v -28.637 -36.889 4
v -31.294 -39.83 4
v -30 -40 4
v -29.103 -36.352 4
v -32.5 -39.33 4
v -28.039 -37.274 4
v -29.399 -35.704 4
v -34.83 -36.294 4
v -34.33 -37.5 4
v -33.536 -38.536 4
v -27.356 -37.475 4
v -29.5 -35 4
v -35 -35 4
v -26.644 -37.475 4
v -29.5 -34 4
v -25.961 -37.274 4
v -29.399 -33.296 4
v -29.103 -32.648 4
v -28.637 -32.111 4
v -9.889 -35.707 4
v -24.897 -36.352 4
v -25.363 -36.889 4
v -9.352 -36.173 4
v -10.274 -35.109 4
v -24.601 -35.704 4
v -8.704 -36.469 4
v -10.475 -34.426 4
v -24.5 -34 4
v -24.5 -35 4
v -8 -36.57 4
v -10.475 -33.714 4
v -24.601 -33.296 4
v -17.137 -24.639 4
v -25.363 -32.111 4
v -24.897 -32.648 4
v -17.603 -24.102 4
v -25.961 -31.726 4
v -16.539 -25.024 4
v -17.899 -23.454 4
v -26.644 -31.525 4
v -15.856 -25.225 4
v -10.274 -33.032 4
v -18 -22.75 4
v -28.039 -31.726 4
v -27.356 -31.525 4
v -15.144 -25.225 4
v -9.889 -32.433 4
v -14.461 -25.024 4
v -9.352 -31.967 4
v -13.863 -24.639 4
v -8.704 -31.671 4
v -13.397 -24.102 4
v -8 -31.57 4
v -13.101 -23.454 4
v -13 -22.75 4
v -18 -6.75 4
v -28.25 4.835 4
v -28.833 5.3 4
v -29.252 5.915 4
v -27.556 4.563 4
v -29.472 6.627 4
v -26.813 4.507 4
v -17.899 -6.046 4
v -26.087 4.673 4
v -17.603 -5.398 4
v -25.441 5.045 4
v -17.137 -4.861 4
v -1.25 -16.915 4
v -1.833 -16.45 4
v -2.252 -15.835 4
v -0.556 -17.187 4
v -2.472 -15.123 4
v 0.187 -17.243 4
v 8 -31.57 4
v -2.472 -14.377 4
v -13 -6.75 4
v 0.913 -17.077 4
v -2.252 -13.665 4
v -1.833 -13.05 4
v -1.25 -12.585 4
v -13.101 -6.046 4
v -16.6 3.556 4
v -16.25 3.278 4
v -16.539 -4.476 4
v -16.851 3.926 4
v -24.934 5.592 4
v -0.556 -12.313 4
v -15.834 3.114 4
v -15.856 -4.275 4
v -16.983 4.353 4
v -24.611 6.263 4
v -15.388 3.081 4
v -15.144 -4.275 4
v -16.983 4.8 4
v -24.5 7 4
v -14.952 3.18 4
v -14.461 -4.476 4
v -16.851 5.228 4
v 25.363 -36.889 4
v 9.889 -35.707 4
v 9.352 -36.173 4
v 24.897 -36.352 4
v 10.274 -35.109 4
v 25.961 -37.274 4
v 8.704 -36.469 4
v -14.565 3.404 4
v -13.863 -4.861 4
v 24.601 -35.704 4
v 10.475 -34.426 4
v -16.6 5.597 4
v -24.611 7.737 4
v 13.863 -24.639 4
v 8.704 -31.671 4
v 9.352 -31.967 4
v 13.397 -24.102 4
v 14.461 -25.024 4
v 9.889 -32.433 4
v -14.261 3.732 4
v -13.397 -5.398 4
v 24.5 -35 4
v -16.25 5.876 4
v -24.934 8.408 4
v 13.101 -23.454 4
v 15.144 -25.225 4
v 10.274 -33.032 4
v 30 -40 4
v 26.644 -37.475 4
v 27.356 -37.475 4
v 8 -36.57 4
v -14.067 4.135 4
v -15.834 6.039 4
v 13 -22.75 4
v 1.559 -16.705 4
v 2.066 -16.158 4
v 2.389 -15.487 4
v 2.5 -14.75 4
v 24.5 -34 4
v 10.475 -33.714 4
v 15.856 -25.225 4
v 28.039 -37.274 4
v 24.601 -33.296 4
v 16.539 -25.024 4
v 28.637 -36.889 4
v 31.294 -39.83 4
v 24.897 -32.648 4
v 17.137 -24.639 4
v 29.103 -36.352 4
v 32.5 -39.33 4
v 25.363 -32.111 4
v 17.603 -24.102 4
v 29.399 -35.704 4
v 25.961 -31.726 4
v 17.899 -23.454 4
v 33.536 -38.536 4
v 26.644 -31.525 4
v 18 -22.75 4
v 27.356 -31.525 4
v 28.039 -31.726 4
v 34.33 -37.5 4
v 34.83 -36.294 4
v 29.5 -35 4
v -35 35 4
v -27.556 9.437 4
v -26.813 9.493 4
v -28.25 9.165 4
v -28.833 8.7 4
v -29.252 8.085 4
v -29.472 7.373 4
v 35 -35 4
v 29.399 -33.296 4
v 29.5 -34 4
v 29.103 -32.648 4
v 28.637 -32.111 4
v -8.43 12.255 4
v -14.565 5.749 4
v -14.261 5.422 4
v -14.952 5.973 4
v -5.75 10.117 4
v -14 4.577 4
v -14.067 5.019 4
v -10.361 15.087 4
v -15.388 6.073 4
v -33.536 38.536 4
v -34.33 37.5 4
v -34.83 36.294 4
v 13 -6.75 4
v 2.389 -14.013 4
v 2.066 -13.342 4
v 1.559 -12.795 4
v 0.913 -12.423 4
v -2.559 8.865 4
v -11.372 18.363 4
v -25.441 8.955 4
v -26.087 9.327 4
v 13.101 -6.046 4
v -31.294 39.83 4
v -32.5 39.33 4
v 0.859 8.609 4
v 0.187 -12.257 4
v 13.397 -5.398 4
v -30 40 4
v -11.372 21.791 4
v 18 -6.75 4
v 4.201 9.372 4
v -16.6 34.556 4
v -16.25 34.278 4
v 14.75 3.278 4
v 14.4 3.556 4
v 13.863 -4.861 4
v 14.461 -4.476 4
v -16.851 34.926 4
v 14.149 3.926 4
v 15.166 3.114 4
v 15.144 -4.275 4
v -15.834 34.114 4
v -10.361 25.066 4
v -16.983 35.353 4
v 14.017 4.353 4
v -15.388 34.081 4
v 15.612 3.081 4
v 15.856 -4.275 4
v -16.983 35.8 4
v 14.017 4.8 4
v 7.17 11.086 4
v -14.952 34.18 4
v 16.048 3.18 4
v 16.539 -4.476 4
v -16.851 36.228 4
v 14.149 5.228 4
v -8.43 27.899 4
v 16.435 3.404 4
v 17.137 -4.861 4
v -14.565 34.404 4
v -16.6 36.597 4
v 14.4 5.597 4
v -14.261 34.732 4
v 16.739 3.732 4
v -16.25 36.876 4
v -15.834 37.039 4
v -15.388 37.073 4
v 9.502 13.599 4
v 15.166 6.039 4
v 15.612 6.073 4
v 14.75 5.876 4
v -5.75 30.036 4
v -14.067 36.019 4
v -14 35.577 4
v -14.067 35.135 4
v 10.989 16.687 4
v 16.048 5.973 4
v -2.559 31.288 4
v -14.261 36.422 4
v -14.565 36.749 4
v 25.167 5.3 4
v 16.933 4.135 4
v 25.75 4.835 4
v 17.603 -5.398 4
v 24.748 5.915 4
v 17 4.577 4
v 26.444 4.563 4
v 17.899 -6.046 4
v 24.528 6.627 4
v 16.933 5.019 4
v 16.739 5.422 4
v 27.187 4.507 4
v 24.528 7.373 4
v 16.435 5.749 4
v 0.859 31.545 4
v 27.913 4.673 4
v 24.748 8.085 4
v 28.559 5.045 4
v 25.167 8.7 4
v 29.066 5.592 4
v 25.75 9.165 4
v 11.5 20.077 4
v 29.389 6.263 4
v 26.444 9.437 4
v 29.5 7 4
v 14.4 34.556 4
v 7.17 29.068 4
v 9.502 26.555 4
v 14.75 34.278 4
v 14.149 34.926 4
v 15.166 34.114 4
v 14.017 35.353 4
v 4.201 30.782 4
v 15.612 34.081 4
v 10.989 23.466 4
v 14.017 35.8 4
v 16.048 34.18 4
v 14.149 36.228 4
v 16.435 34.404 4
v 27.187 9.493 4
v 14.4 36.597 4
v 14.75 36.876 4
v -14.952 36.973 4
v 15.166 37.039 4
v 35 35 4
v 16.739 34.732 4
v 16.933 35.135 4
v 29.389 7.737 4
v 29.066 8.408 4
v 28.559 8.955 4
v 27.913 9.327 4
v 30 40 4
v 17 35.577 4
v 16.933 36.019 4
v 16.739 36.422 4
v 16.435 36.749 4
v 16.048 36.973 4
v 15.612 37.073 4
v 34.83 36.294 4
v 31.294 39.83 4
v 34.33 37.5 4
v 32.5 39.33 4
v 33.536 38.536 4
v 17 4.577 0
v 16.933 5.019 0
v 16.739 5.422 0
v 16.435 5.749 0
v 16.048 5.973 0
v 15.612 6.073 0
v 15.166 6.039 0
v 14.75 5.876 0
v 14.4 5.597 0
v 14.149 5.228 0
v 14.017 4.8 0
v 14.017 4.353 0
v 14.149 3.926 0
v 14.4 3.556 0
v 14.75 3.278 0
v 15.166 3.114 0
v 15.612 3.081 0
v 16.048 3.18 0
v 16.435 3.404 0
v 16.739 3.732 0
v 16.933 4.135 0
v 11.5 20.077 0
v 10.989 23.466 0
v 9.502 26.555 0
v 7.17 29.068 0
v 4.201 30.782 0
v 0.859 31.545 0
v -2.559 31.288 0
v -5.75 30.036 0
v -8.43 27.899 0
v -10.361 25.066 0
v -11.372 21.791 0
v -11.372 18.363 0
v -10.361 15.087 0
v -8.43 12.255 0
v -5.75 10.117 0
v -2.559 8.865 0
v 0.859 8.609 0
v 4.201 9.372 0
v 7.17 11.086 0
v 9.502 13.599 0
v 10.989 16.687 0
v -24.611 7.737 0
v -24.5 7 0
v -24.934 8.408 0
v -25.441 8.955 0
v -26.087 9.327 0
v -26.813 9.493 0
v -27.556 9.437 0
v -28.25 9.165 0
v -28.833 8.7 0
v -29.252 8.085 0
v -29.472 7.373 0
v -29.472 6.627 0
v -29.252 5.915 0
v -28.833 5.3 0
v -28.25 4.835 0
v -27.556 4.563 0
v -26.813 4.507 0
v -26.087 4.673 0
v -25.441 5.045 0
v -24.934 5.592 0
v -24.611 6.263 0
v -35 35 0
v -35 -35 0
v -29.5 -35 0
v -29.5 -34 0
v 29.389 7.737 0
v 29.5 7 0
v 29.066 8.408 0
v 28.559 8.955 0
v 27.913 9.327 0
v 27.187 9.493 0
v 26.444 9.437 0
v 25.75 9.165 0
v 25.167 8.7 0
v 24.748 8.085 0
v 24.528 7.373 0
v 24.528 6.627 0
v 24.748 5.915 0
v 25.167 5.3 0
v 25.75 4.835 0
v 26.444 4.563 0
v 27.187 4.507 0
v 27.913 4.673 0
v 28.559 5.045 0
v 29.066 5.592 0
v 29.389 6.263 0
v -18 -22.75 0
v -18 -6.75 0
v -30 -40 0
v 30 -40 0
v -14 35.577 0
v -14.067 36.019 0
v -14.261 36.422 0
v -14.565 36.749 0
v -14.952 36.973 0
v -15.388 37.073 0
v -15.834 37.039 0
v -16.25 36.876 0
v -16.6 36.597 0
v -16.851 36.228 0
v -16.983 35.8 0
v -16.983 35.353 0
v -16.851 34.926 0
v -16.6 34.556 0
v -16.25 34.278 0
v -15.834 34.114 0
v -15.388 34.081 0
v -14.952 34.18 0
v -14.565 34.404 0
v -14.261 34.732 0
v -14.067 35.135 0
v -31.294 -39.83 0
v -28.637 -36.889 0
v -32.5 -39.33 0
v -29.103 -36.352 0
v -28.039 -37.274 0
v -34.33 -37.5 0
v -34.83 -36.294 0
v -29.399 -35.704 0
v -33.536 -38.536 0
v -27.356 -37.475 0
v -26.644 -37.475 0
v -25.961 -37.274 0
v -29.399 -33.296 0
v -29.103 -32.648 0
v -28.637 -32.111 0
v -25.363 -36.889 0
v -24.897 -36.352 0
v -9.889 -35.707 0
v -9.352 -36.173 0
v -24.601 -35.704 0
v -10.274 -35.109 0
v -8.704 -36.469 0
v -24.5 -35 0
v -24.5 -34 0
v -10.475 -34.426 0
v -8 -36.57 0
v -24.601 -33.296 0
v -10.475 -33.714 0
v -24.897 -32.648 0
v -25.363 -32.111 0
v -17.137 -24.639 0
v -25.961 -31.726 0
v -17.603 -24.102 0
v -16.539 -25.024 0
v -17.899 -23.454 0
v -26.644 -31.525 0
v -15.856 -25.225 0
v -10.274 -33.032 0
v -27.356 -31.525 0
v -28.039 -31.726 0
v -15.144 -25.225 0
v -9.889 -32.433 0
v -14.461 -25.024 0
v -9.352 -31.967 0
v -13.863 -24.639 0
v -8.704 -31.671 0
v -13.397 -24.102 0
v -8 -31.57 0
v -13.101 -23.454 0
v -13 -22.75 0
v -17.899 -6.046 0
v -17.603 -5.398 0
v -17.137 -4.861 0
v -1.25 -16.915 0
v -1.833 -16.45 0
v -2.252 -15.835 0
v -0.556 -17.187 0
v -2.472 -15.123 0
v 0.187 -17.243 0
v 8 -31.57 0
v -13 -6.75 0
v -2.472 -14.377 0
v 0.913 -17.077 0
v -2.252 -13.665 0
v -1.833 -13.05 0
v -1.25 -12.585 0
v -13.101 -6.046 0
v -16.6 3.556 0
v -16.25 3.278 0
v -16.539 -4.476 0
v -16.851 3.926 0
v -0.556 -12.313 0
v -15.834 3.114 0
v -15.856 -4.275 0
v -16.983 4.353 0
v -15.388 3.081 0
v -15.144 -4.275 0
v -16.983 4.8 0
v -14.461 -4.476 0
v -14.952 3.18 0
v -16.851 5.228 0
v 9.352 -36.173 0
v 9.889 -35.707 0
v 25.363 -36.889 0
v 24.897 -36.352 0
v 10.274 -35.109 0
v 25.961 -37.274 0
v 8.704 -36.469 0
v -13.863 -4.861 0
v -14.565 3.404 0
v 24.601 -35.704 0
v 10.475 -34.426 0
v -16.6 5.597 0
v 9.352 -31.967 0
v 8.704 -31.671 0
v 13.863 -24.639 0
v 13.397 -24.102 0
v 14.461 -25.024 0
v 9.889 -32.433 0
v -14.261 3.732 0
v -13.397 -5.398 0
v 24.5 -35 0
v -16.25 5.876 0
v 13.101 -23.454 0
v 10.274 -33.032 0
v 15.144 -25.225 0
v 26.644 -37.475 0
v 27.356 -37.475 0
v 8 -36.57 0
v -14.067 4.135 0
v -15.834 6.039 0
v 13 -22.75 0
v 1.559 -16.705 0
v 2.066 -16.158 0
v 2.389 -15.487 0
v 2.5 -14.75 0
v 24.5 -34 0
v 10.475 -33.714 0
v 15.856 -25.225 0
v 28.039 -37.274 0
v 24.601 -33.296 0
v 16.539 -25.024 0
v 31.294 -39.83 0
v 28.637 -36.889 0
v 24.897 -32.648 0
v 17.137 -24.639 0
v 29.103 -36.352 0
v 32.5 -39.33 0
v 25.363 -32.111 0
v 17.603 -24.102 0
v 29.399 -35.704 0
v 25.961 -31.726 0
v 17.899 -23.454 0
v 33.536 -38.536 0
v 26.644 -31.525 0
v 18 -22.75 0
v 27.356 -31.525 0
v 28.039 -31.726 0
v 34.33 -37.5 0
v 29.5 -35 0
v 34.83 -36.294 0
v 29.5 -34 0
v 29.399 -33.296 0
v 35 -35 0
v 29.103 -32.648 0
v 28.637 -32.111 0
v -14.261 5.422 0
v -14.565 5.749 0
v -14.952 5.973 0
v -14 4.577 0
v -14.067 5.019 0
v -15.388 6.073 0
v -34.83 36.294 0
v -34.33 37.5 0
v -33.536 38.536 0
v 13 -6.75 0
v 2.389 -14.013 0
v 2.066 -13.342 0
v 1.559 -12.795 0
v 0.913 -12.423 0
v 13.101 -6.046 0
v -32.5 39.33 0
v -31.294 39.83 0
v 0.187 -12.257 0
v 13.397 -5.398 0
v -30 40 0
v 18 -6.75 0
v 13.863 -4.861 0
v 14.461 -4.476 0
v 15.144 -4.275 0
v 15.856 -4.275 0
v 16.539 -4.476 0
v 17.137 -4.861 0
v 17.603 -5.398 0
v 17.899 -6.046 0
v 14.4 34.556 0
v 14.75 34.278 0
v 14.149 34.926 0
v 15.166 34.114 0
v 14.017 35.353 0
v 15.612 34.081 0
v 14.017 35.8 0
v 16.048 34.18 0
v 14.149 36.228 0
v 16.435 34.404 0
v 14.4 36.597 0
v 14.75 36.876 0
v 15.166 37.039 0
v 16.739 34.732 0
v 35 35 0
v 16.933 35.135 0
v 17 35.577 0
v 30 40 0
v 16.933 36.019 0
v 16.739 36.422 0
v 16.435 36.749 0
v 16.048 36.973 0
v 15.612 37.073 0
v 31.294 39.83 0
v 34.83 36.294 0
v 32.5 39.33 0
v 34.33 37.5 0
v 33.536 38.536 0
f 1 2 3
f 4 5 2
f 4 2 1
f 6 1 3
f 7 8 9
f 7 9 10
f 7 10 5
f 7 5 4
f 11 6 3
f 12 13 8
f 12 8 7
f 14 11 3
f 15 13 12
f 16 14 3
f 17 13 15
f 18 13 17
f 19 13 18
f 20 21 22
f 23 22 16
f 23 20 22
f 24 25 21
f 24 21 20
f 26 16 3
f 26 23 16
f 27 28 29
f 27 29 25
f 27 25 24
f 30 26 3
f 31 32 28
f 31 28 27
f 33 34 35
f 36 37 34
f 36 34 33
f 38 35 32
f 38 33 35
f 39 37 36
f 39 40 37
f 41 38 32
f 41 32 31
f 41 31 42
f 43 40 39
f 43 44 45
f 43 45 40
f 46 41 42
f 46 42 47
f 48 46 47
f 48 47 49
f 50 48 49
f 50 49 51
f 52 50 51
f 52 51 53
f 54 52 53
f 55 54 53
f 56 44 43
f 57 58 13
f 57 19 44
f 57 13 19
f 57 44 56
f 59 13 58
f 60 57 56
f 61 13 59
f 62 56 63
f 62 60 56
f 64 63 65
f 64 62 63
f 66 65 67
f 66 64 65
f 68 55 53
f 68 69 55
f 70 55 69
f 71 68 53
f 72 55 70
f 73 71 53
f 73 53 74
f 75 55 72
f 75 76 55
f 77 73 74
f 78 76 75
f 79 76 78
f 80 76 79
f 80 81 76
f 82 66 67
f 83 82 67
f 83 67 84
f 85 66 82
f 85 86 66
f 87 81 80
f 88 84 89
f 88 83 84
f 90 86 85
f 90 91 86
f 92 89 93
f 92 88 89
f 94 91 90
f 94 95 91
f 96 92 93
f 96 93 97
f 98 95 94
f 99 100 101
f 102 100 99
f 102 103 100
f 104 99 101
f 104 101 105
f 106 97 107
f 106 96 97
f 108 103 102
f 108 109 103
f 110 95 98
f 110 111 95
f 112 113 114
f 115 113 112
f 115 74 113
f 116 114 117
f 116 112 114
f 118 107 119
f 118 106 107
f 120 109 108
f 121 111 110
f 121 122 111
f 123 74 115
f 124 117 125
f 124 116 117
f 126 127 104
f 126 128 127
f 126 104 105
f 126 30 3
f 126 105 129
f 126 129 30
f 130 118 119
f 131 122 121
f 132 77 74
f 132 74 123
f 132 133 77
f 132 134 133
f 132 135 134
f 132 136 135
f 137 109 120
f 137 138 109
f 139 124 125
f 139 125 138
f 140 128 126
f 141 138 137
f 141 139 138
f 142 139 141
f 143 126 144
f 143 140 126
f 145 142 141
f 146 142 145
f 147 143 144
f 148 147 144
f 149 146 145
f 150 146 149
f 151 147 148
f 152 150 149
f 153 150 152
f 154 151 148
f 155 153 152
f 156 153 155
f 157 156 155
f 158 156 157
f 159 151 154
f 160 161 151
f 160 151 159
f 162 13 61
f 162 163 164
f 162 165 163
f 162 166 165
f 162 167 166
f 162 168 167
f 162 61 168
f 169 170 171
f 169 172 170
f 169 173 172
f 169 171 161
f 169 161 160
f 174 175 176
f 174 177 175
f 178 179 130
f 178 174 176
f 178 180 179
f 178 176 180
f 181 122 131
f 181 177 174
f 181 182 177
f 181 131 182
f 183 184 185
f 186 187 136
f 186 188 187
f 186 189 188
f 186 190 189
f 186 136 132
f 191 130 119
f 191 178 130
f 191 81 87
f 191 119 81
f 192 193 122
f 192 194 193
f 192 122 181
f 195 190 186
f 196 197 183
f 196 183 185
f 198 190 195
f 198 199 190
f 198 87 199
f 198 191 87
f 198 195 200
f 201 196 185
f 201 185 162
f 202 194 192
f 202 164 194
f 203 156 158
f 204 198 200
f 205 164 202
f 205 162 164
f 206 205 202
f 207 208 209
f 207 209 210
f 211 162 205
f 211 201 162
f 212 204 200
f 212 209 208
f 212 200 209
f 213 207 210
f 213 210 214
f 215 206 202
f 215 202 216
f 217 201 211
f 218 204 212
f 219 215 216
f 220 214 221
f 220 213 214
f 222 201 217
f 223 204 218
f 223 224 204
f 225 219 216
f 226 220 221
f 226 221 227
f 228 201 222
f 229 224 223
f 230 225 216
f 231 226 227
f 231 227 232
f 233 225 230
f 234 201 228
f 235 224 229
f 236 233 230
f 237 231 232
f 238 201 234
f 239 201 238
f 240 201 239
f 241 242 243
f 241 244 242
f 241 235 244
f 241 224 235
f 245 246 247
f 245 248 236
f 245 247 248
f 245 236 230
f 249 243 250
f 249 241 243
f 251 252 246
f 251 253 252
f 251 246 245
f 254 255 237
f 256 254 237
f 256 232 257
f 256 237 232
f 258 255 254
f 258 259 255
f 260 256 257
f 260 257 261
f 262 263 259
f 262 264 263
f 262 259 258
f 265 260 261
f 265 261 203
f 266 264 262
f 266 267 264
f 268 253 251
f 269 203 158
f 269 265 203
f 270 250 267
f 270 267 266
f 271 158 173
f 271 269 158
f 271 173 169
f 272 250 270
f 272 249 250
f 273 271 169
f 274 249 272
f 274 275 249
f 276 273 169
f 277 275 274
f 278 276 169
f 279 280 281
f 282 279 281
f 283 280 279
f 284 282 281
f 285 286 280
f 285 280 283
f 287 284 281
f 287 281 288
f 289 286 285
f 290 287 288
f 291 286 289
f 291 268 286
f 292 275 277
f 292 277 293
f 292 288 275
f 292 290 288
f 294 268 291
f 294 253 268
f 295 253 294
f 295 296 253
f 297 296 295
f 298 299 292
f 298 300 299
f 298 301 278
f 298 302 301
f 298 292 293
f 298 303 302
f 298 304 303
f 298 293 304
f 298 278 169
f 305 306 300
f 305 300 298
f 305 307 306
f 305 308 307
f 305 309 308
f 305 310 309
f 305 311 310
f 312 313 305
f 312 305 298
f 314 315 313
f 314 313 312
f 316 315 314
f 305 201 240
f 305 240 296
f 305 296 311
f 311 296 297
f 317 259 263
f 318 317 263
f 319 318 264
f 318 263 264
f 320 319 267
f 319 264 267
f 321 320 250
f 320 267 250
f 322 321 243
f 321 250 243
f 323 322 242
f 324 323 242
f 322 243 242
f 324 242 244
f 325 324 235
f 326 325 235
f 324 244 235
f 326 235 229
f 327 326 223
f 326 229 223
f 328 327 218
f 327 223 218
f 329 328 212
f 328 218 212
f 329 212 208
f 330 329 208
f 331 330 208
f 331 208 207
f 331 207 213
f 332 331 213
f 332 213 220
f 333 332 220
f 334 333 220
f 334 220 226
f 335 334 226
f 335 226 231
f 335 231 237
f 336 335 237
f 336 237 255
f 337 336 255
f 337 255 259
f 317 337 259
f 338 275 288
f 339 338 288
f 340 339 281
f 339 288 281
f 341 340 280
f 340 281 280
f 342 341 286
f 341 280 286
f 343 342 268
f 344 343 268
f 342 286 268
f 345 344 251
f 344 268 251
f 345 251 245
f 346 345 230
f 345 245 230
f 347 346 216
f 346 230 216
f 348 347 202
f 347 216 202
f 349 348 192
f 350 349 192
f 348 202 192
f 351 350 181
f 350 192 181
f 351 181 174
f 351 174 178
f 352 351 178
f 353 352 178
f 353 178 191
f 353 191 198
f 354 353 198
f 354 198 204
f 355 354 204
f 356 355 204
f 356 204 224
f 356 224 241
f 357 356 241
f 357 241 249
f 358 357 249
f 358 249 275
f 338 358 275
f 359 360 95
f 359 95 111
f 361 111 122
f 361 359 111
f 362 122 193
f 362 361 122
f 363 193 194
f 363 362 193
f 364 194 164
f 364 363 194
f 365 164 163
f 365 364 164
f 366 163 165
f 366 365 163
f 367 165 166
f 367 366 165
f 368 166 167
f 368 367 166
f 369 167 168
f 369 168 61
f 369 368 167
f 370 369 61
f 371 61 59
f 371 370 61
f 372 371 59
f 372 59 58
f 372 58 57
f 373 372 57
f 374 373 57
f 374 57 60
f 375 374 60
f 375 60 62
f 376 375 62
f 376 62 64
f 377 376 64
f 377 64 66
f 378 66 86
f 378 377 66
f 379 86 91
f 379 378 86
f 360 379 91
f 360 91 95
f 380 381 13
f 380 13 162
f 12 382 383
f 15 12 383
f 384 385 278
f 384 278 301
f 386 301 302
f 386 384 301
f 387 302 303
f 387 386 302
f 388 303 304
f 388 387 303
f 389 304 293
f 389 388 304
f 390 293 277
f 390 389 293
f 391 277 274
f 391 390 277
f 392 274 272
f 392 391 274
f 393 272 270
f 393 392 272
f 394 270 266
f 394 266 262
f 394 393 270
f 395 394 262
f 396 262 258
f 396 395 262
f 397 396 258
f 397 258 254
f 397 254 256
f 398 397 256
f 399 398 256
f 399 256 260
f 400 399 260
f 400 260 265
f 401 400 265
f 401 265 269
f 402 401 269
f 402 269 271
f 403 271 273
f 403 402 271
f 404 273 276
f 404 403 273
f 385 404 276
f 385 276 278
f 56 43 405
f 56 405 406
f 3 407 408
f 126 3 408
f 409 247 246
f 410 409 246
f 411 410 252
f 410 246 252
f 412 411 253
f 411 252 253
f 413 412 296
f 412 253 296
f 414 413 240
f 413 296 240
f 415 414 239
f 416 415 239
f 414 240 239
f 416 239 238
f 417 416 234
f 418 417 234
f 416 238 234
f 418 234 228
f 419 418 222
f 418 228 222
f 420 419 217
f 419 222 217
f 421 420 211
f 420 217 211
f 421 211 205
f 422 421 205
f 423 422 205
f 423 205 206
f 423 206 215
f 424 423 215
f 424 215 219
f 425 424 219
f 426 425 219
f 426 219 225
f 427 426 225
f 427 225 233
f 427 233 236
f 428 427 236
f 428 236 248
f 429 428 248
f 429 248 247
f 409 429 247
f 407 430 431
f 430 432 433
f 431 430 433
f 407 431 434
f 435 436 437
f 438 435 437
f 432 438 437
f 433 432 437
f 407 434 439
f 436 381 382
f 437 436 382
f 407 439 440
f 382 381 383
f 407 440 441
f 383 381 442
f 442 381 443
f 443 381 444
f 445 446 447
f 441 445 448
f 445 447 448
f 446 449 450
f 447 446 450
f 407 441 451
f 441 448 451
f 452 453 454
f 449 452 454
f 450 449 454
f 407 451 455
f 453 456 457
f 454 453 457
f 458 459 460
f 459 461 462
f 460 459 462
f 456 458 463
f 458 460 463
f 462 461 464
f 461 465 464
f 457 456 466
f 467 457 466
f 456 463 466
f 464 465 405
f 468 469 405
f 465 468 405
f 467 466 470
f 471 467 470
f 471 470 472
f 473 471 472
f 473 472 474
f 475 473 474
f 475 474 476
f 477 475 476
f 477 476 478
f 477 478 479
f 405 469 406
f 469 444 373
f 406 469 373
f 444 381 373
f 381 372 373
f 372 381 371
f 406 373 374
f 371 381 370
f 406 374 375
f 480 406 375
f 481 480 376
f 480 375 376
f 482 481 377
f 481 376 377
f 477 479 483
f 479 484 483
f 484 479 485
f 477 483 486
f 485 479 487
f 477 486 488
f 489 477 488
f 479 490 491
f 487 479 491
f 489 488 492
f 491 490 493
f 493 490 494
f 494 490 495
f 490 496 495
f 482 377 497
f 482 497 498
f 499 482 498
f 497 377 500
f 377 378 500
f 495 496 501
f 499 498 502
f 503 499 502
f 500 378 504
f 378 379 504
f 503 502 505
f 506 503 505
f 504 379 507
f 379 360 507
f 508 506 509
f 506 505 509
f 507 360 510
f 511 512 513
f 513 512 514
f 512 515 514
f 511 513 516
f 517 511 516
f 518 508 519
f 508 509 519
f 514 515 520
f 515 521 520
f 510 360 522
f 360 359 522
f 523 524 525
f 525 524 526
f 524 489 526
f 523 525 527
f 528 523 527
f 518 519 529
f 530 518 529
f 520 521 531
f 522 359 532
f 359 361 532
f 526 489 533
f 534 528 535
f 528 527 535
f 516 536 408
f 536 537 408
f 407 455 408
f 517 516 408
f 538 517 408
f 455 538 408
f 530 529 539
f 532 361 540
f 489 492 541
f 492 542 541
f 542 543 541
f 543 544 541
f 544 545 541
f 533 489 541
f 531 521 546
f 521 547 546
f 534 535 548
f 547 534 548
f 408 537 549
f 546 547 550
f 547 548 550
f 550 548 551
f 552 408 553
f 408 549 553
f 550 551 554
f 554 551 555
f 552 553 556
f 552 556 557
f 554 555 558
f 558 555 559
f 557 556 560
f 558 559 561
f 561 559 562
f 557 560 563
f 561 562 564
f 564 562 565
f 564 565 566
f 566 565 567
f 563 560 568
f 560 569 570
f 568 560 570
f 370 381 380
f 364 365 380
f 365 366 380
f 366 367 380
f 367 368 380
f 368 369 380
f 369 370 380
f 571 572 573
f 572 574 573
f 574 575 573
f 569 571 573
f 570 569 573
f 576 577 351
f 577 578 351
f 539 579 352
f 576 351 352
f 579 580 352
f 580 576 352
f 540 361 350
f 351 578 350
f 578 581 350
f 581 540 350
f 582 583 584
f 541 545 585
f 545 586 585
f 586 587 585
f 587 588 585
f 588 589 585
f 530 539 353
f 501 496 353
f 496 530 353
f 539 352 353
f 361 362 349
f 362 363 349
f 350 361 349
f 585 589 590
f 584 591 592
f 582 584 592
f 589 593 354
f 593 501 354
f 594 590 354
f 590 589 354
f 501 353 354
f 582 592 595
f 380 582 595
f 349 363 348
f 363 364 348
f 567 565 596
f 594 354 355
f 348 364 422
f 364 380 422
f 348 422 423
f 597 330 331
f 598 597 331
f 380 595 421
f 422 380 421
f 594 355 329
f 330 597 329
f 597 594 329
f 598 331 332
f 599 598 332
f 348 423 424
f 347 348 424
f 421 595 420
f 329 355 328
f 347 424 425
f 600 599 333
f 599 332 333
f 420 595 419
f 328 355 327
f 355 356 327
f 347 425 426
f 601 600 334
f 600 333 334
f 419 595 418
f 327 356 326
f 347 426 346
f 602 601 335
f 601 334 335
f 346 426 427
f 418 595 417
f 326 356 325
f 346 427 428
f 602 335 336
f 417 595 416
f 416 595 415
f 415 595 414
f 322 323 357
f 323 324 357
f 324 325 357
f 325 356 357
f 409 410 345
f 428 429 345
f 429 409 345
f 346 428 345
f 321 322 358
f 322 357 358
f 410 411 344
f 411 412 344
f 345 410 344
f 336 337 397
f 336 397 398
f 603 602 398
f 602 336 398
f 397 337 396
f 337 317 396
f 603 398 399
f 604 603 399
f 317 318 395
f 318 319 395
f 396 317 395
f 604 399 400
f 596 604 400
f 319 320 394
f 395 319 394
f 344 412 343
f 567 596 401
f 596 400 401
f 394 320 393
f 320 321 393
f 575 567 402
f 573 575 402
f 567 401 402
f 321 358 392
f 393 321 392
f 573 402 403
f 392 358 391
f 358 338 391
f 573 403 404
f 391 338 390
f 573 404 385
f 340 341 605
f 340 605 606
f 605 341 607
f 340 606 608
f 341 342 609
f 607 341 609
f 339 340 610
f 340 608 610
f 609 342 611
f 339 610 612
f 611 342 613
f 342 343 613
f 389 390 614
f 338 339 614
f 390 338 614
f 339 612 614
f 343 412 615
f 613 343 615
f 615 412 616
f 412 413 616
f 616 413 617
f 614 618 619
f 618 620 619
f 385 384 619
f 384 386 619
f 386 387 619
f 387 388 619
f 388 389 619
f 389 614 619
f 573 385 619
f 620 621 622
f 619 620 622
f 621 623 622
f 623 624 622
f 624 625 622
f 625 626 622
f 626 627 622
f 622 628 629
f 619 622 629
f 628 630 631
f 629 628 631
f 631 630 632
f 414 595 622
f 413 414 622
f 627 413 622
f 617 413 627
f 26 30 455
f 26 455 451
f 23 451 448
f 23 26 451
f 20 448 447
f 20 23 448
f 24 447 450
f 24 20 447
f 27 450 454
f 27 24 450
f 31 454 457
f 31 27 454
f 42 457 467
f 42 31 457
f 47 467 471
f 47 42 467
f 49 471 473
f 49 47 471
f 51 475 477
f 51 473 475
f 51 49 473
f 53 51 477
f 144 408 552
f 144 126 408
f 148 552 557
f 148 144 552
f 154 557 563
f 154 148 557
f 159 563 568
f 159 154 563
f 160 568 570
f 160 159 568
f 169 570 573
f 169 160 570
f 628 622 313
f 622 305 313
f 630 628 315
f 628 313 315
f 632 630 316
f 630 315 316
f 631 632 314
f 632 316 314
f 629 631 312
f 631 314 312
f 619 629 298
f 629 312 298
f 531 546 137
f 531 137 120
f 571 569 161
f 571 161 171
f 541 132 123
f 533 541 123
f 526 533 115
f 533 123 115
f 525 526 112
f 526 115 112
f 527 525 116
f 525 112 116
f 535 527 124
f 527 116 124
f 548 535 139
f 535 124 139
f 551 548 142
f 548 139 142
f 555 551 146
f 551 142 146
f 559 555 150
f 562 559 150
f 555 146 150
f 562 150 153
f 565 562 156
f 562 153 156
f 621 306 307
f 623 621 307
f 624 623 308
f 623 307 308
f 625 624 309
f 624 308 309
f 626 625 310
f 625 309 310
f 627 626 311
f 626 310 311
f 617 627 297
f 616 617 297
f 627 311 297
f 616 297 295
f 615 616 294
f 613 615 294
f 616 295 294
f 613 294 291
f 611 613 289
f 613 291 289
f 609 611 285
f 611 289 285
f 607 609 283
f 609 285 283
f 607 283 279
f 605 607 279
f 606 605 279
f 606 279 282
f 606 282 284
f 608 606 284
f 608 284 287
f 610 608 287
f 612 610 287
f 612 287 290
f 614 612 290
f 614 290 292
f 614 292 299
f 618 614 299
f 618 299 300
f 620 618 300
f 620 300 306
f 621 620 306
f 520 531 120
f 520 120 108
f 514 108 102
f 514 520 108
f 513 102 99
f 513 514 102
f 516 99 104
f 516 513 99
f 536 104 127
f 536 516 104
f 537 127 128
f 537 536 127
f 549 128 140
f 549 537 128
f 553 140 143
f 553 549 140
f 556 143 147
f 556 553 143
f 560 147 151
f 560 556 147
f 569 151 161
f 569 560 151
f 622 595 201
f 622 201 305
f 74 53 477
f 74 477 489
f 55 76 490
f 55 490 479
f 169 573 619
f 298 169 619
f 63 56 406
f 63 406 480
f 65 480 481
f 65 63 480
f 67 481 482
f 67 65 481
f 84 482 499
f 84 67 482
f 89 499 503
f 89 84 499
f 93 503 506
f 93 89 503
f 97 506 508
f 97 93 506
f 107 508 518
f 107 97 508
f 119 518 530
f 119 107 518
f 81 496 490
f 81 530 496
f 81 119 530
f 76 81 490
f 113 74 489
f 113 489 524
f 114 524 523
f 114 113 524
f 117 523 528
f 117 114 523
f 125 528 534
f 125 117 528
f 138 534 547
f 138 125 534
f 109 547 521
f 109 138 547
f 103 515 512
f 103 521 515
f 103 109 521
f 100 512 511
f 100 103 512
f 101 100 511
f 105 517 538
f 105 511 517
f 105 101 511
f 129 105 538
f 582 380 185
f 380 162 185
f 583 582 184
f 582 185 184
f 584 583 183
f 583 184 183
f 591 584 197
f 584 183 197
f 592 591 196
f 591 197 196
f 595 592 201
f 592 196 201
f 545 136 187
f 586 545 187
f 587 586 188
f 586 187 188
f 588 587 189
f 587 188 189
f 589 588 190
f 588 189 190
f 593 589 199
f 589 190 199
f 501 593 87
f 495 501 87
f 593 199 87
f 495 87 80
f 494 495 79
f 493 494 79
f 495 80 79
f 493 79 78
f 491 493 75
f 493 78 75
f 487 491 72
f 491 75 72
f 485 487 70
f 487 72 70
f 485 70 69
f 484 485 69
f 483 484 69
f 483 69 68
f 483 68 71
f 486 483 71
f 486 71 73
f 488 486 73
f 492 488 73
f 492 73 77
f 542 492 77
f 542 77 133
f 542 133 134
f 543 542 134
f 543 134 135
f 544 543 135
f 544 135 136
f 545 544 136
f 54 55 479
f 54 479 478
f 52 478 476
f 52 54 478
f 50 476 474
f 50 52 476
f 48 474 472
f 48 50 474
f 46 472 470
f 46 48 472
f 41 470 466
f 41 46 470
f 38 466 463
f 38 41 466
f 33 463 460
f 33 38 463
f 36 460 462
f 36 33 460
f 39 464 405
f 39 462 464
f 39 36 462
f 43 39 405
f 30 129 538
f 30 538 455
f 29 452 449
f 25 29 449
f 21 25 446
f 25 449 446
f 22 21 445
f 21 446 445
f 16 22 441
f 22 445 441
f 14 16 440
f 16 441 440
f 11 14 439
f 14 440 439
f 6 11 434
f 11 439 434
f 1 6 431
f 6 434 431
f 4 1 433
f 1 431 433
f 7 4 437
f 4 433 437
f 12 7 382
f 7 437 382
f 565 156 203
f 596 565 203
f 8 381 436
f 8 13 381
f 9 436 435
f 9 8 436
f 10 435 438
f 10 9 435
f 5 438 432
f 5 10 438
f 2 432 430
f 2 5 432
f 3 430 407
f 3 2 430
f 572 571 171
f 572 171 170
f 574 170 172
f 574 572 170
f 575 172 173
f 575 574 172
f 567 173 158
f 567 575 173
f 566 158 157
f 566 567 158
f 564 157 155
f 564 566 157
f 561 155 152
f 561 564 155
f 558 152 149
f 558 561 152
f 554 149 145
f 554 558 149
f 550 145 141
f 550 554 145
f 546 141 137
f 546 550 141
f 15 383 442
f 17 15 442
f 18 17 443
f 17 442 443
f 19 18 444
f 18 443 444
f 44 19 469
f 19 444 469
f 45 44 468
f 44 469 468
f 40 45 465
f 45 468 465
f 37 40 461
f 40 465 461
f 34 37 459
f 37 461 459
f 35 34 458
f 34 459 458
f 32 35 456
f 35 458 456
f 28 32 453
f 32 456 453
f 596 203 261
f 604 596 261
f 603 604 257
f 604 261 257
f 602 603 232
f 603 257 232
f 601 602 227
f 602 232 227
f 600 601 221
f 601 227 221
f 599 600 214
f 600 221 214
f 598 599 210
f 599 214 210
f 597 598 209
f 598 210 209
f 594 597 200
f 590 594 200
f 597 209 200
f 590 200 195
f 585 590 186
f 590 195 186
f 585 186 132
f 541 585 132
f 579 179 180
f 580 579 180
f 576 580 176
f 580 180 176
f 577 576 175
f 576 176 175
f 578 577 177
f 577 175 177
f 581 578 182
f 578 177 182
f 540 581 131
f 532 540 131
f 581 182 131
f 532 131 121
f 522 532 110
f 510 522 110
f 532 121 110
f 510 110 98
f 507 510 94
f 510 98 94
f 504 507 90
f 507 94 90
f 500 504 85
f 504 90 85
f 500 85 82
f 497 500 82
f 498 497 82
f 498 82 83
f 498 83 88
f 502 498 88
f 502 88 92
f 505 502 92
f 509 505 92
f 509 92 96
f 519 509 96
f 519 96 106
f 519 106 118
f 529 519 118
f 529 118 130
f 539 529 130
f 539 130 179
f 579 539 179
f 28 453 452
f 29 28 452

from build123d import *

# Parameters (mm, degrees)
SKETCH4_W           = 70
SKETCH4_H           = 80
SKETCH4_R           = 2.5
BOSS_EXTRUDE2_DEPTH = 4
SKETCH5_R           = 11.5
SKETCH5_R_2         = 1.5
SKETCH5_R_3         = 2.5
CUT_EXTRUDE2_DEPTH  = 5
FILLET1_R           = 5


with BuildPart() as part:
    # Sketch4 → Boss-Extrude2 (new body)
    with BuildSketch(Plane.XY):
        Rectangle(SKETCH4_W, SKETCH4_H)
        with Locations((-27, 7)):
            Circle(SKETCH4_R, mode=Mode.SUBTRACT)
        with Locations((27, 7)):
            Circle(SKETCH4_R, mode=Mode.SUBTRACT)
        with BuildLine():
            Line((-24.5, -34), (-24.5, -35))
            ThreePointArc((-24.5, -35), (-27, -37.5), (-29.5, -35))
            Line((-29.5, -35), (-29.5, -34))
            ThreePointArc((-29.5, -34), (-27, -31.5), (-24.5, -34))
        make_face(mode=Mode.SUBTRACT)
        with BuildLine():
            Line((24.5, -34), (24.5, -35))
            ThreePointArc((24.5, -35), (27, -37.5), (29.5, -35))
            Line((29.5, -35), (29.5, -34))
            ThreePointArc((29.5, -34), (27, -31.5), (24.5, -34))
        make_face(mode=Mode.SUBTRACT)
    extrude(amount=BOSS_EXTRUDE2_DEPTH)

    # Sketch5 → Cut-Extrude2 (cut, through all)
    with BuildSketch(Plane.XY.offset(4)):
        with Locations((0, 20.076696831)):
            Circle(SKETCH5_R)
        with Locations((-15.5, 35.576696831)):
            Circle(SKETCH5_R_2)
        with Locations((15.5, 35.576696831)):
            Circle(SKETCH5_R_2)
        with Locations((15.5, 4.576696831)):
            Circle(SKETCH5_R_2)
        with Locations((-15.5, 4.576696831)):
            Circle(SKETCH5_R_2)
        with Locations((0, -14.75)):
            Circle(SKETCH5_R_3)
        with BuildLine():
            Line((-8, -31.570071963), (8, -31.570071963))
            ThreePointArc((8, -31.570071963), (10.5, -34.070071963), (8, -36.570071963))
            Line((8, -36.570071963), (-8, -36.570071963))
            ThreePointArc((-8, -36.570071963), (-10.5, -34.070071963), (-8, -31.570071963))
        make_face()
        with BuildLine():
            Line((-13, -6.75), (-13, -22.75))
            ThreePointArc((-13, -22.75), (-15.5, -25.25), (-18, -22.75))
            Line((-18, -22.75), (-18, -6.75))
            ThreePointArc((-18, -6.75), (-15.5, -4.25), (-13, -6.75))
        make_face()
        with BuildLine():
            Line((13, -6.75), (13, -22.75))
            ThreePointArc((13, -22.75), (15.5, -25.25), (18, -22.75))
            Line((18, -22.75), (18, -6.75))
            ThreePointArc((18, -6.75), (15.5, -4.25), (13, -6.75))
        make_face()
    extrude(amount=-CUT_EXTRUDE2_DEPTH, mode=Mode.SUBTRACT)

    # Fillet1
    fillet1_edges = [part.edges().sort_by_distance(p)[0] for p in [
        (35, -40, 2),
        (-35, -40, 2),
        (-35, 40, 2),
        (35, 40, 2),
    ]]
    fillet(fillet1_edges, radius=FILLET1_R)


solid = part.part
